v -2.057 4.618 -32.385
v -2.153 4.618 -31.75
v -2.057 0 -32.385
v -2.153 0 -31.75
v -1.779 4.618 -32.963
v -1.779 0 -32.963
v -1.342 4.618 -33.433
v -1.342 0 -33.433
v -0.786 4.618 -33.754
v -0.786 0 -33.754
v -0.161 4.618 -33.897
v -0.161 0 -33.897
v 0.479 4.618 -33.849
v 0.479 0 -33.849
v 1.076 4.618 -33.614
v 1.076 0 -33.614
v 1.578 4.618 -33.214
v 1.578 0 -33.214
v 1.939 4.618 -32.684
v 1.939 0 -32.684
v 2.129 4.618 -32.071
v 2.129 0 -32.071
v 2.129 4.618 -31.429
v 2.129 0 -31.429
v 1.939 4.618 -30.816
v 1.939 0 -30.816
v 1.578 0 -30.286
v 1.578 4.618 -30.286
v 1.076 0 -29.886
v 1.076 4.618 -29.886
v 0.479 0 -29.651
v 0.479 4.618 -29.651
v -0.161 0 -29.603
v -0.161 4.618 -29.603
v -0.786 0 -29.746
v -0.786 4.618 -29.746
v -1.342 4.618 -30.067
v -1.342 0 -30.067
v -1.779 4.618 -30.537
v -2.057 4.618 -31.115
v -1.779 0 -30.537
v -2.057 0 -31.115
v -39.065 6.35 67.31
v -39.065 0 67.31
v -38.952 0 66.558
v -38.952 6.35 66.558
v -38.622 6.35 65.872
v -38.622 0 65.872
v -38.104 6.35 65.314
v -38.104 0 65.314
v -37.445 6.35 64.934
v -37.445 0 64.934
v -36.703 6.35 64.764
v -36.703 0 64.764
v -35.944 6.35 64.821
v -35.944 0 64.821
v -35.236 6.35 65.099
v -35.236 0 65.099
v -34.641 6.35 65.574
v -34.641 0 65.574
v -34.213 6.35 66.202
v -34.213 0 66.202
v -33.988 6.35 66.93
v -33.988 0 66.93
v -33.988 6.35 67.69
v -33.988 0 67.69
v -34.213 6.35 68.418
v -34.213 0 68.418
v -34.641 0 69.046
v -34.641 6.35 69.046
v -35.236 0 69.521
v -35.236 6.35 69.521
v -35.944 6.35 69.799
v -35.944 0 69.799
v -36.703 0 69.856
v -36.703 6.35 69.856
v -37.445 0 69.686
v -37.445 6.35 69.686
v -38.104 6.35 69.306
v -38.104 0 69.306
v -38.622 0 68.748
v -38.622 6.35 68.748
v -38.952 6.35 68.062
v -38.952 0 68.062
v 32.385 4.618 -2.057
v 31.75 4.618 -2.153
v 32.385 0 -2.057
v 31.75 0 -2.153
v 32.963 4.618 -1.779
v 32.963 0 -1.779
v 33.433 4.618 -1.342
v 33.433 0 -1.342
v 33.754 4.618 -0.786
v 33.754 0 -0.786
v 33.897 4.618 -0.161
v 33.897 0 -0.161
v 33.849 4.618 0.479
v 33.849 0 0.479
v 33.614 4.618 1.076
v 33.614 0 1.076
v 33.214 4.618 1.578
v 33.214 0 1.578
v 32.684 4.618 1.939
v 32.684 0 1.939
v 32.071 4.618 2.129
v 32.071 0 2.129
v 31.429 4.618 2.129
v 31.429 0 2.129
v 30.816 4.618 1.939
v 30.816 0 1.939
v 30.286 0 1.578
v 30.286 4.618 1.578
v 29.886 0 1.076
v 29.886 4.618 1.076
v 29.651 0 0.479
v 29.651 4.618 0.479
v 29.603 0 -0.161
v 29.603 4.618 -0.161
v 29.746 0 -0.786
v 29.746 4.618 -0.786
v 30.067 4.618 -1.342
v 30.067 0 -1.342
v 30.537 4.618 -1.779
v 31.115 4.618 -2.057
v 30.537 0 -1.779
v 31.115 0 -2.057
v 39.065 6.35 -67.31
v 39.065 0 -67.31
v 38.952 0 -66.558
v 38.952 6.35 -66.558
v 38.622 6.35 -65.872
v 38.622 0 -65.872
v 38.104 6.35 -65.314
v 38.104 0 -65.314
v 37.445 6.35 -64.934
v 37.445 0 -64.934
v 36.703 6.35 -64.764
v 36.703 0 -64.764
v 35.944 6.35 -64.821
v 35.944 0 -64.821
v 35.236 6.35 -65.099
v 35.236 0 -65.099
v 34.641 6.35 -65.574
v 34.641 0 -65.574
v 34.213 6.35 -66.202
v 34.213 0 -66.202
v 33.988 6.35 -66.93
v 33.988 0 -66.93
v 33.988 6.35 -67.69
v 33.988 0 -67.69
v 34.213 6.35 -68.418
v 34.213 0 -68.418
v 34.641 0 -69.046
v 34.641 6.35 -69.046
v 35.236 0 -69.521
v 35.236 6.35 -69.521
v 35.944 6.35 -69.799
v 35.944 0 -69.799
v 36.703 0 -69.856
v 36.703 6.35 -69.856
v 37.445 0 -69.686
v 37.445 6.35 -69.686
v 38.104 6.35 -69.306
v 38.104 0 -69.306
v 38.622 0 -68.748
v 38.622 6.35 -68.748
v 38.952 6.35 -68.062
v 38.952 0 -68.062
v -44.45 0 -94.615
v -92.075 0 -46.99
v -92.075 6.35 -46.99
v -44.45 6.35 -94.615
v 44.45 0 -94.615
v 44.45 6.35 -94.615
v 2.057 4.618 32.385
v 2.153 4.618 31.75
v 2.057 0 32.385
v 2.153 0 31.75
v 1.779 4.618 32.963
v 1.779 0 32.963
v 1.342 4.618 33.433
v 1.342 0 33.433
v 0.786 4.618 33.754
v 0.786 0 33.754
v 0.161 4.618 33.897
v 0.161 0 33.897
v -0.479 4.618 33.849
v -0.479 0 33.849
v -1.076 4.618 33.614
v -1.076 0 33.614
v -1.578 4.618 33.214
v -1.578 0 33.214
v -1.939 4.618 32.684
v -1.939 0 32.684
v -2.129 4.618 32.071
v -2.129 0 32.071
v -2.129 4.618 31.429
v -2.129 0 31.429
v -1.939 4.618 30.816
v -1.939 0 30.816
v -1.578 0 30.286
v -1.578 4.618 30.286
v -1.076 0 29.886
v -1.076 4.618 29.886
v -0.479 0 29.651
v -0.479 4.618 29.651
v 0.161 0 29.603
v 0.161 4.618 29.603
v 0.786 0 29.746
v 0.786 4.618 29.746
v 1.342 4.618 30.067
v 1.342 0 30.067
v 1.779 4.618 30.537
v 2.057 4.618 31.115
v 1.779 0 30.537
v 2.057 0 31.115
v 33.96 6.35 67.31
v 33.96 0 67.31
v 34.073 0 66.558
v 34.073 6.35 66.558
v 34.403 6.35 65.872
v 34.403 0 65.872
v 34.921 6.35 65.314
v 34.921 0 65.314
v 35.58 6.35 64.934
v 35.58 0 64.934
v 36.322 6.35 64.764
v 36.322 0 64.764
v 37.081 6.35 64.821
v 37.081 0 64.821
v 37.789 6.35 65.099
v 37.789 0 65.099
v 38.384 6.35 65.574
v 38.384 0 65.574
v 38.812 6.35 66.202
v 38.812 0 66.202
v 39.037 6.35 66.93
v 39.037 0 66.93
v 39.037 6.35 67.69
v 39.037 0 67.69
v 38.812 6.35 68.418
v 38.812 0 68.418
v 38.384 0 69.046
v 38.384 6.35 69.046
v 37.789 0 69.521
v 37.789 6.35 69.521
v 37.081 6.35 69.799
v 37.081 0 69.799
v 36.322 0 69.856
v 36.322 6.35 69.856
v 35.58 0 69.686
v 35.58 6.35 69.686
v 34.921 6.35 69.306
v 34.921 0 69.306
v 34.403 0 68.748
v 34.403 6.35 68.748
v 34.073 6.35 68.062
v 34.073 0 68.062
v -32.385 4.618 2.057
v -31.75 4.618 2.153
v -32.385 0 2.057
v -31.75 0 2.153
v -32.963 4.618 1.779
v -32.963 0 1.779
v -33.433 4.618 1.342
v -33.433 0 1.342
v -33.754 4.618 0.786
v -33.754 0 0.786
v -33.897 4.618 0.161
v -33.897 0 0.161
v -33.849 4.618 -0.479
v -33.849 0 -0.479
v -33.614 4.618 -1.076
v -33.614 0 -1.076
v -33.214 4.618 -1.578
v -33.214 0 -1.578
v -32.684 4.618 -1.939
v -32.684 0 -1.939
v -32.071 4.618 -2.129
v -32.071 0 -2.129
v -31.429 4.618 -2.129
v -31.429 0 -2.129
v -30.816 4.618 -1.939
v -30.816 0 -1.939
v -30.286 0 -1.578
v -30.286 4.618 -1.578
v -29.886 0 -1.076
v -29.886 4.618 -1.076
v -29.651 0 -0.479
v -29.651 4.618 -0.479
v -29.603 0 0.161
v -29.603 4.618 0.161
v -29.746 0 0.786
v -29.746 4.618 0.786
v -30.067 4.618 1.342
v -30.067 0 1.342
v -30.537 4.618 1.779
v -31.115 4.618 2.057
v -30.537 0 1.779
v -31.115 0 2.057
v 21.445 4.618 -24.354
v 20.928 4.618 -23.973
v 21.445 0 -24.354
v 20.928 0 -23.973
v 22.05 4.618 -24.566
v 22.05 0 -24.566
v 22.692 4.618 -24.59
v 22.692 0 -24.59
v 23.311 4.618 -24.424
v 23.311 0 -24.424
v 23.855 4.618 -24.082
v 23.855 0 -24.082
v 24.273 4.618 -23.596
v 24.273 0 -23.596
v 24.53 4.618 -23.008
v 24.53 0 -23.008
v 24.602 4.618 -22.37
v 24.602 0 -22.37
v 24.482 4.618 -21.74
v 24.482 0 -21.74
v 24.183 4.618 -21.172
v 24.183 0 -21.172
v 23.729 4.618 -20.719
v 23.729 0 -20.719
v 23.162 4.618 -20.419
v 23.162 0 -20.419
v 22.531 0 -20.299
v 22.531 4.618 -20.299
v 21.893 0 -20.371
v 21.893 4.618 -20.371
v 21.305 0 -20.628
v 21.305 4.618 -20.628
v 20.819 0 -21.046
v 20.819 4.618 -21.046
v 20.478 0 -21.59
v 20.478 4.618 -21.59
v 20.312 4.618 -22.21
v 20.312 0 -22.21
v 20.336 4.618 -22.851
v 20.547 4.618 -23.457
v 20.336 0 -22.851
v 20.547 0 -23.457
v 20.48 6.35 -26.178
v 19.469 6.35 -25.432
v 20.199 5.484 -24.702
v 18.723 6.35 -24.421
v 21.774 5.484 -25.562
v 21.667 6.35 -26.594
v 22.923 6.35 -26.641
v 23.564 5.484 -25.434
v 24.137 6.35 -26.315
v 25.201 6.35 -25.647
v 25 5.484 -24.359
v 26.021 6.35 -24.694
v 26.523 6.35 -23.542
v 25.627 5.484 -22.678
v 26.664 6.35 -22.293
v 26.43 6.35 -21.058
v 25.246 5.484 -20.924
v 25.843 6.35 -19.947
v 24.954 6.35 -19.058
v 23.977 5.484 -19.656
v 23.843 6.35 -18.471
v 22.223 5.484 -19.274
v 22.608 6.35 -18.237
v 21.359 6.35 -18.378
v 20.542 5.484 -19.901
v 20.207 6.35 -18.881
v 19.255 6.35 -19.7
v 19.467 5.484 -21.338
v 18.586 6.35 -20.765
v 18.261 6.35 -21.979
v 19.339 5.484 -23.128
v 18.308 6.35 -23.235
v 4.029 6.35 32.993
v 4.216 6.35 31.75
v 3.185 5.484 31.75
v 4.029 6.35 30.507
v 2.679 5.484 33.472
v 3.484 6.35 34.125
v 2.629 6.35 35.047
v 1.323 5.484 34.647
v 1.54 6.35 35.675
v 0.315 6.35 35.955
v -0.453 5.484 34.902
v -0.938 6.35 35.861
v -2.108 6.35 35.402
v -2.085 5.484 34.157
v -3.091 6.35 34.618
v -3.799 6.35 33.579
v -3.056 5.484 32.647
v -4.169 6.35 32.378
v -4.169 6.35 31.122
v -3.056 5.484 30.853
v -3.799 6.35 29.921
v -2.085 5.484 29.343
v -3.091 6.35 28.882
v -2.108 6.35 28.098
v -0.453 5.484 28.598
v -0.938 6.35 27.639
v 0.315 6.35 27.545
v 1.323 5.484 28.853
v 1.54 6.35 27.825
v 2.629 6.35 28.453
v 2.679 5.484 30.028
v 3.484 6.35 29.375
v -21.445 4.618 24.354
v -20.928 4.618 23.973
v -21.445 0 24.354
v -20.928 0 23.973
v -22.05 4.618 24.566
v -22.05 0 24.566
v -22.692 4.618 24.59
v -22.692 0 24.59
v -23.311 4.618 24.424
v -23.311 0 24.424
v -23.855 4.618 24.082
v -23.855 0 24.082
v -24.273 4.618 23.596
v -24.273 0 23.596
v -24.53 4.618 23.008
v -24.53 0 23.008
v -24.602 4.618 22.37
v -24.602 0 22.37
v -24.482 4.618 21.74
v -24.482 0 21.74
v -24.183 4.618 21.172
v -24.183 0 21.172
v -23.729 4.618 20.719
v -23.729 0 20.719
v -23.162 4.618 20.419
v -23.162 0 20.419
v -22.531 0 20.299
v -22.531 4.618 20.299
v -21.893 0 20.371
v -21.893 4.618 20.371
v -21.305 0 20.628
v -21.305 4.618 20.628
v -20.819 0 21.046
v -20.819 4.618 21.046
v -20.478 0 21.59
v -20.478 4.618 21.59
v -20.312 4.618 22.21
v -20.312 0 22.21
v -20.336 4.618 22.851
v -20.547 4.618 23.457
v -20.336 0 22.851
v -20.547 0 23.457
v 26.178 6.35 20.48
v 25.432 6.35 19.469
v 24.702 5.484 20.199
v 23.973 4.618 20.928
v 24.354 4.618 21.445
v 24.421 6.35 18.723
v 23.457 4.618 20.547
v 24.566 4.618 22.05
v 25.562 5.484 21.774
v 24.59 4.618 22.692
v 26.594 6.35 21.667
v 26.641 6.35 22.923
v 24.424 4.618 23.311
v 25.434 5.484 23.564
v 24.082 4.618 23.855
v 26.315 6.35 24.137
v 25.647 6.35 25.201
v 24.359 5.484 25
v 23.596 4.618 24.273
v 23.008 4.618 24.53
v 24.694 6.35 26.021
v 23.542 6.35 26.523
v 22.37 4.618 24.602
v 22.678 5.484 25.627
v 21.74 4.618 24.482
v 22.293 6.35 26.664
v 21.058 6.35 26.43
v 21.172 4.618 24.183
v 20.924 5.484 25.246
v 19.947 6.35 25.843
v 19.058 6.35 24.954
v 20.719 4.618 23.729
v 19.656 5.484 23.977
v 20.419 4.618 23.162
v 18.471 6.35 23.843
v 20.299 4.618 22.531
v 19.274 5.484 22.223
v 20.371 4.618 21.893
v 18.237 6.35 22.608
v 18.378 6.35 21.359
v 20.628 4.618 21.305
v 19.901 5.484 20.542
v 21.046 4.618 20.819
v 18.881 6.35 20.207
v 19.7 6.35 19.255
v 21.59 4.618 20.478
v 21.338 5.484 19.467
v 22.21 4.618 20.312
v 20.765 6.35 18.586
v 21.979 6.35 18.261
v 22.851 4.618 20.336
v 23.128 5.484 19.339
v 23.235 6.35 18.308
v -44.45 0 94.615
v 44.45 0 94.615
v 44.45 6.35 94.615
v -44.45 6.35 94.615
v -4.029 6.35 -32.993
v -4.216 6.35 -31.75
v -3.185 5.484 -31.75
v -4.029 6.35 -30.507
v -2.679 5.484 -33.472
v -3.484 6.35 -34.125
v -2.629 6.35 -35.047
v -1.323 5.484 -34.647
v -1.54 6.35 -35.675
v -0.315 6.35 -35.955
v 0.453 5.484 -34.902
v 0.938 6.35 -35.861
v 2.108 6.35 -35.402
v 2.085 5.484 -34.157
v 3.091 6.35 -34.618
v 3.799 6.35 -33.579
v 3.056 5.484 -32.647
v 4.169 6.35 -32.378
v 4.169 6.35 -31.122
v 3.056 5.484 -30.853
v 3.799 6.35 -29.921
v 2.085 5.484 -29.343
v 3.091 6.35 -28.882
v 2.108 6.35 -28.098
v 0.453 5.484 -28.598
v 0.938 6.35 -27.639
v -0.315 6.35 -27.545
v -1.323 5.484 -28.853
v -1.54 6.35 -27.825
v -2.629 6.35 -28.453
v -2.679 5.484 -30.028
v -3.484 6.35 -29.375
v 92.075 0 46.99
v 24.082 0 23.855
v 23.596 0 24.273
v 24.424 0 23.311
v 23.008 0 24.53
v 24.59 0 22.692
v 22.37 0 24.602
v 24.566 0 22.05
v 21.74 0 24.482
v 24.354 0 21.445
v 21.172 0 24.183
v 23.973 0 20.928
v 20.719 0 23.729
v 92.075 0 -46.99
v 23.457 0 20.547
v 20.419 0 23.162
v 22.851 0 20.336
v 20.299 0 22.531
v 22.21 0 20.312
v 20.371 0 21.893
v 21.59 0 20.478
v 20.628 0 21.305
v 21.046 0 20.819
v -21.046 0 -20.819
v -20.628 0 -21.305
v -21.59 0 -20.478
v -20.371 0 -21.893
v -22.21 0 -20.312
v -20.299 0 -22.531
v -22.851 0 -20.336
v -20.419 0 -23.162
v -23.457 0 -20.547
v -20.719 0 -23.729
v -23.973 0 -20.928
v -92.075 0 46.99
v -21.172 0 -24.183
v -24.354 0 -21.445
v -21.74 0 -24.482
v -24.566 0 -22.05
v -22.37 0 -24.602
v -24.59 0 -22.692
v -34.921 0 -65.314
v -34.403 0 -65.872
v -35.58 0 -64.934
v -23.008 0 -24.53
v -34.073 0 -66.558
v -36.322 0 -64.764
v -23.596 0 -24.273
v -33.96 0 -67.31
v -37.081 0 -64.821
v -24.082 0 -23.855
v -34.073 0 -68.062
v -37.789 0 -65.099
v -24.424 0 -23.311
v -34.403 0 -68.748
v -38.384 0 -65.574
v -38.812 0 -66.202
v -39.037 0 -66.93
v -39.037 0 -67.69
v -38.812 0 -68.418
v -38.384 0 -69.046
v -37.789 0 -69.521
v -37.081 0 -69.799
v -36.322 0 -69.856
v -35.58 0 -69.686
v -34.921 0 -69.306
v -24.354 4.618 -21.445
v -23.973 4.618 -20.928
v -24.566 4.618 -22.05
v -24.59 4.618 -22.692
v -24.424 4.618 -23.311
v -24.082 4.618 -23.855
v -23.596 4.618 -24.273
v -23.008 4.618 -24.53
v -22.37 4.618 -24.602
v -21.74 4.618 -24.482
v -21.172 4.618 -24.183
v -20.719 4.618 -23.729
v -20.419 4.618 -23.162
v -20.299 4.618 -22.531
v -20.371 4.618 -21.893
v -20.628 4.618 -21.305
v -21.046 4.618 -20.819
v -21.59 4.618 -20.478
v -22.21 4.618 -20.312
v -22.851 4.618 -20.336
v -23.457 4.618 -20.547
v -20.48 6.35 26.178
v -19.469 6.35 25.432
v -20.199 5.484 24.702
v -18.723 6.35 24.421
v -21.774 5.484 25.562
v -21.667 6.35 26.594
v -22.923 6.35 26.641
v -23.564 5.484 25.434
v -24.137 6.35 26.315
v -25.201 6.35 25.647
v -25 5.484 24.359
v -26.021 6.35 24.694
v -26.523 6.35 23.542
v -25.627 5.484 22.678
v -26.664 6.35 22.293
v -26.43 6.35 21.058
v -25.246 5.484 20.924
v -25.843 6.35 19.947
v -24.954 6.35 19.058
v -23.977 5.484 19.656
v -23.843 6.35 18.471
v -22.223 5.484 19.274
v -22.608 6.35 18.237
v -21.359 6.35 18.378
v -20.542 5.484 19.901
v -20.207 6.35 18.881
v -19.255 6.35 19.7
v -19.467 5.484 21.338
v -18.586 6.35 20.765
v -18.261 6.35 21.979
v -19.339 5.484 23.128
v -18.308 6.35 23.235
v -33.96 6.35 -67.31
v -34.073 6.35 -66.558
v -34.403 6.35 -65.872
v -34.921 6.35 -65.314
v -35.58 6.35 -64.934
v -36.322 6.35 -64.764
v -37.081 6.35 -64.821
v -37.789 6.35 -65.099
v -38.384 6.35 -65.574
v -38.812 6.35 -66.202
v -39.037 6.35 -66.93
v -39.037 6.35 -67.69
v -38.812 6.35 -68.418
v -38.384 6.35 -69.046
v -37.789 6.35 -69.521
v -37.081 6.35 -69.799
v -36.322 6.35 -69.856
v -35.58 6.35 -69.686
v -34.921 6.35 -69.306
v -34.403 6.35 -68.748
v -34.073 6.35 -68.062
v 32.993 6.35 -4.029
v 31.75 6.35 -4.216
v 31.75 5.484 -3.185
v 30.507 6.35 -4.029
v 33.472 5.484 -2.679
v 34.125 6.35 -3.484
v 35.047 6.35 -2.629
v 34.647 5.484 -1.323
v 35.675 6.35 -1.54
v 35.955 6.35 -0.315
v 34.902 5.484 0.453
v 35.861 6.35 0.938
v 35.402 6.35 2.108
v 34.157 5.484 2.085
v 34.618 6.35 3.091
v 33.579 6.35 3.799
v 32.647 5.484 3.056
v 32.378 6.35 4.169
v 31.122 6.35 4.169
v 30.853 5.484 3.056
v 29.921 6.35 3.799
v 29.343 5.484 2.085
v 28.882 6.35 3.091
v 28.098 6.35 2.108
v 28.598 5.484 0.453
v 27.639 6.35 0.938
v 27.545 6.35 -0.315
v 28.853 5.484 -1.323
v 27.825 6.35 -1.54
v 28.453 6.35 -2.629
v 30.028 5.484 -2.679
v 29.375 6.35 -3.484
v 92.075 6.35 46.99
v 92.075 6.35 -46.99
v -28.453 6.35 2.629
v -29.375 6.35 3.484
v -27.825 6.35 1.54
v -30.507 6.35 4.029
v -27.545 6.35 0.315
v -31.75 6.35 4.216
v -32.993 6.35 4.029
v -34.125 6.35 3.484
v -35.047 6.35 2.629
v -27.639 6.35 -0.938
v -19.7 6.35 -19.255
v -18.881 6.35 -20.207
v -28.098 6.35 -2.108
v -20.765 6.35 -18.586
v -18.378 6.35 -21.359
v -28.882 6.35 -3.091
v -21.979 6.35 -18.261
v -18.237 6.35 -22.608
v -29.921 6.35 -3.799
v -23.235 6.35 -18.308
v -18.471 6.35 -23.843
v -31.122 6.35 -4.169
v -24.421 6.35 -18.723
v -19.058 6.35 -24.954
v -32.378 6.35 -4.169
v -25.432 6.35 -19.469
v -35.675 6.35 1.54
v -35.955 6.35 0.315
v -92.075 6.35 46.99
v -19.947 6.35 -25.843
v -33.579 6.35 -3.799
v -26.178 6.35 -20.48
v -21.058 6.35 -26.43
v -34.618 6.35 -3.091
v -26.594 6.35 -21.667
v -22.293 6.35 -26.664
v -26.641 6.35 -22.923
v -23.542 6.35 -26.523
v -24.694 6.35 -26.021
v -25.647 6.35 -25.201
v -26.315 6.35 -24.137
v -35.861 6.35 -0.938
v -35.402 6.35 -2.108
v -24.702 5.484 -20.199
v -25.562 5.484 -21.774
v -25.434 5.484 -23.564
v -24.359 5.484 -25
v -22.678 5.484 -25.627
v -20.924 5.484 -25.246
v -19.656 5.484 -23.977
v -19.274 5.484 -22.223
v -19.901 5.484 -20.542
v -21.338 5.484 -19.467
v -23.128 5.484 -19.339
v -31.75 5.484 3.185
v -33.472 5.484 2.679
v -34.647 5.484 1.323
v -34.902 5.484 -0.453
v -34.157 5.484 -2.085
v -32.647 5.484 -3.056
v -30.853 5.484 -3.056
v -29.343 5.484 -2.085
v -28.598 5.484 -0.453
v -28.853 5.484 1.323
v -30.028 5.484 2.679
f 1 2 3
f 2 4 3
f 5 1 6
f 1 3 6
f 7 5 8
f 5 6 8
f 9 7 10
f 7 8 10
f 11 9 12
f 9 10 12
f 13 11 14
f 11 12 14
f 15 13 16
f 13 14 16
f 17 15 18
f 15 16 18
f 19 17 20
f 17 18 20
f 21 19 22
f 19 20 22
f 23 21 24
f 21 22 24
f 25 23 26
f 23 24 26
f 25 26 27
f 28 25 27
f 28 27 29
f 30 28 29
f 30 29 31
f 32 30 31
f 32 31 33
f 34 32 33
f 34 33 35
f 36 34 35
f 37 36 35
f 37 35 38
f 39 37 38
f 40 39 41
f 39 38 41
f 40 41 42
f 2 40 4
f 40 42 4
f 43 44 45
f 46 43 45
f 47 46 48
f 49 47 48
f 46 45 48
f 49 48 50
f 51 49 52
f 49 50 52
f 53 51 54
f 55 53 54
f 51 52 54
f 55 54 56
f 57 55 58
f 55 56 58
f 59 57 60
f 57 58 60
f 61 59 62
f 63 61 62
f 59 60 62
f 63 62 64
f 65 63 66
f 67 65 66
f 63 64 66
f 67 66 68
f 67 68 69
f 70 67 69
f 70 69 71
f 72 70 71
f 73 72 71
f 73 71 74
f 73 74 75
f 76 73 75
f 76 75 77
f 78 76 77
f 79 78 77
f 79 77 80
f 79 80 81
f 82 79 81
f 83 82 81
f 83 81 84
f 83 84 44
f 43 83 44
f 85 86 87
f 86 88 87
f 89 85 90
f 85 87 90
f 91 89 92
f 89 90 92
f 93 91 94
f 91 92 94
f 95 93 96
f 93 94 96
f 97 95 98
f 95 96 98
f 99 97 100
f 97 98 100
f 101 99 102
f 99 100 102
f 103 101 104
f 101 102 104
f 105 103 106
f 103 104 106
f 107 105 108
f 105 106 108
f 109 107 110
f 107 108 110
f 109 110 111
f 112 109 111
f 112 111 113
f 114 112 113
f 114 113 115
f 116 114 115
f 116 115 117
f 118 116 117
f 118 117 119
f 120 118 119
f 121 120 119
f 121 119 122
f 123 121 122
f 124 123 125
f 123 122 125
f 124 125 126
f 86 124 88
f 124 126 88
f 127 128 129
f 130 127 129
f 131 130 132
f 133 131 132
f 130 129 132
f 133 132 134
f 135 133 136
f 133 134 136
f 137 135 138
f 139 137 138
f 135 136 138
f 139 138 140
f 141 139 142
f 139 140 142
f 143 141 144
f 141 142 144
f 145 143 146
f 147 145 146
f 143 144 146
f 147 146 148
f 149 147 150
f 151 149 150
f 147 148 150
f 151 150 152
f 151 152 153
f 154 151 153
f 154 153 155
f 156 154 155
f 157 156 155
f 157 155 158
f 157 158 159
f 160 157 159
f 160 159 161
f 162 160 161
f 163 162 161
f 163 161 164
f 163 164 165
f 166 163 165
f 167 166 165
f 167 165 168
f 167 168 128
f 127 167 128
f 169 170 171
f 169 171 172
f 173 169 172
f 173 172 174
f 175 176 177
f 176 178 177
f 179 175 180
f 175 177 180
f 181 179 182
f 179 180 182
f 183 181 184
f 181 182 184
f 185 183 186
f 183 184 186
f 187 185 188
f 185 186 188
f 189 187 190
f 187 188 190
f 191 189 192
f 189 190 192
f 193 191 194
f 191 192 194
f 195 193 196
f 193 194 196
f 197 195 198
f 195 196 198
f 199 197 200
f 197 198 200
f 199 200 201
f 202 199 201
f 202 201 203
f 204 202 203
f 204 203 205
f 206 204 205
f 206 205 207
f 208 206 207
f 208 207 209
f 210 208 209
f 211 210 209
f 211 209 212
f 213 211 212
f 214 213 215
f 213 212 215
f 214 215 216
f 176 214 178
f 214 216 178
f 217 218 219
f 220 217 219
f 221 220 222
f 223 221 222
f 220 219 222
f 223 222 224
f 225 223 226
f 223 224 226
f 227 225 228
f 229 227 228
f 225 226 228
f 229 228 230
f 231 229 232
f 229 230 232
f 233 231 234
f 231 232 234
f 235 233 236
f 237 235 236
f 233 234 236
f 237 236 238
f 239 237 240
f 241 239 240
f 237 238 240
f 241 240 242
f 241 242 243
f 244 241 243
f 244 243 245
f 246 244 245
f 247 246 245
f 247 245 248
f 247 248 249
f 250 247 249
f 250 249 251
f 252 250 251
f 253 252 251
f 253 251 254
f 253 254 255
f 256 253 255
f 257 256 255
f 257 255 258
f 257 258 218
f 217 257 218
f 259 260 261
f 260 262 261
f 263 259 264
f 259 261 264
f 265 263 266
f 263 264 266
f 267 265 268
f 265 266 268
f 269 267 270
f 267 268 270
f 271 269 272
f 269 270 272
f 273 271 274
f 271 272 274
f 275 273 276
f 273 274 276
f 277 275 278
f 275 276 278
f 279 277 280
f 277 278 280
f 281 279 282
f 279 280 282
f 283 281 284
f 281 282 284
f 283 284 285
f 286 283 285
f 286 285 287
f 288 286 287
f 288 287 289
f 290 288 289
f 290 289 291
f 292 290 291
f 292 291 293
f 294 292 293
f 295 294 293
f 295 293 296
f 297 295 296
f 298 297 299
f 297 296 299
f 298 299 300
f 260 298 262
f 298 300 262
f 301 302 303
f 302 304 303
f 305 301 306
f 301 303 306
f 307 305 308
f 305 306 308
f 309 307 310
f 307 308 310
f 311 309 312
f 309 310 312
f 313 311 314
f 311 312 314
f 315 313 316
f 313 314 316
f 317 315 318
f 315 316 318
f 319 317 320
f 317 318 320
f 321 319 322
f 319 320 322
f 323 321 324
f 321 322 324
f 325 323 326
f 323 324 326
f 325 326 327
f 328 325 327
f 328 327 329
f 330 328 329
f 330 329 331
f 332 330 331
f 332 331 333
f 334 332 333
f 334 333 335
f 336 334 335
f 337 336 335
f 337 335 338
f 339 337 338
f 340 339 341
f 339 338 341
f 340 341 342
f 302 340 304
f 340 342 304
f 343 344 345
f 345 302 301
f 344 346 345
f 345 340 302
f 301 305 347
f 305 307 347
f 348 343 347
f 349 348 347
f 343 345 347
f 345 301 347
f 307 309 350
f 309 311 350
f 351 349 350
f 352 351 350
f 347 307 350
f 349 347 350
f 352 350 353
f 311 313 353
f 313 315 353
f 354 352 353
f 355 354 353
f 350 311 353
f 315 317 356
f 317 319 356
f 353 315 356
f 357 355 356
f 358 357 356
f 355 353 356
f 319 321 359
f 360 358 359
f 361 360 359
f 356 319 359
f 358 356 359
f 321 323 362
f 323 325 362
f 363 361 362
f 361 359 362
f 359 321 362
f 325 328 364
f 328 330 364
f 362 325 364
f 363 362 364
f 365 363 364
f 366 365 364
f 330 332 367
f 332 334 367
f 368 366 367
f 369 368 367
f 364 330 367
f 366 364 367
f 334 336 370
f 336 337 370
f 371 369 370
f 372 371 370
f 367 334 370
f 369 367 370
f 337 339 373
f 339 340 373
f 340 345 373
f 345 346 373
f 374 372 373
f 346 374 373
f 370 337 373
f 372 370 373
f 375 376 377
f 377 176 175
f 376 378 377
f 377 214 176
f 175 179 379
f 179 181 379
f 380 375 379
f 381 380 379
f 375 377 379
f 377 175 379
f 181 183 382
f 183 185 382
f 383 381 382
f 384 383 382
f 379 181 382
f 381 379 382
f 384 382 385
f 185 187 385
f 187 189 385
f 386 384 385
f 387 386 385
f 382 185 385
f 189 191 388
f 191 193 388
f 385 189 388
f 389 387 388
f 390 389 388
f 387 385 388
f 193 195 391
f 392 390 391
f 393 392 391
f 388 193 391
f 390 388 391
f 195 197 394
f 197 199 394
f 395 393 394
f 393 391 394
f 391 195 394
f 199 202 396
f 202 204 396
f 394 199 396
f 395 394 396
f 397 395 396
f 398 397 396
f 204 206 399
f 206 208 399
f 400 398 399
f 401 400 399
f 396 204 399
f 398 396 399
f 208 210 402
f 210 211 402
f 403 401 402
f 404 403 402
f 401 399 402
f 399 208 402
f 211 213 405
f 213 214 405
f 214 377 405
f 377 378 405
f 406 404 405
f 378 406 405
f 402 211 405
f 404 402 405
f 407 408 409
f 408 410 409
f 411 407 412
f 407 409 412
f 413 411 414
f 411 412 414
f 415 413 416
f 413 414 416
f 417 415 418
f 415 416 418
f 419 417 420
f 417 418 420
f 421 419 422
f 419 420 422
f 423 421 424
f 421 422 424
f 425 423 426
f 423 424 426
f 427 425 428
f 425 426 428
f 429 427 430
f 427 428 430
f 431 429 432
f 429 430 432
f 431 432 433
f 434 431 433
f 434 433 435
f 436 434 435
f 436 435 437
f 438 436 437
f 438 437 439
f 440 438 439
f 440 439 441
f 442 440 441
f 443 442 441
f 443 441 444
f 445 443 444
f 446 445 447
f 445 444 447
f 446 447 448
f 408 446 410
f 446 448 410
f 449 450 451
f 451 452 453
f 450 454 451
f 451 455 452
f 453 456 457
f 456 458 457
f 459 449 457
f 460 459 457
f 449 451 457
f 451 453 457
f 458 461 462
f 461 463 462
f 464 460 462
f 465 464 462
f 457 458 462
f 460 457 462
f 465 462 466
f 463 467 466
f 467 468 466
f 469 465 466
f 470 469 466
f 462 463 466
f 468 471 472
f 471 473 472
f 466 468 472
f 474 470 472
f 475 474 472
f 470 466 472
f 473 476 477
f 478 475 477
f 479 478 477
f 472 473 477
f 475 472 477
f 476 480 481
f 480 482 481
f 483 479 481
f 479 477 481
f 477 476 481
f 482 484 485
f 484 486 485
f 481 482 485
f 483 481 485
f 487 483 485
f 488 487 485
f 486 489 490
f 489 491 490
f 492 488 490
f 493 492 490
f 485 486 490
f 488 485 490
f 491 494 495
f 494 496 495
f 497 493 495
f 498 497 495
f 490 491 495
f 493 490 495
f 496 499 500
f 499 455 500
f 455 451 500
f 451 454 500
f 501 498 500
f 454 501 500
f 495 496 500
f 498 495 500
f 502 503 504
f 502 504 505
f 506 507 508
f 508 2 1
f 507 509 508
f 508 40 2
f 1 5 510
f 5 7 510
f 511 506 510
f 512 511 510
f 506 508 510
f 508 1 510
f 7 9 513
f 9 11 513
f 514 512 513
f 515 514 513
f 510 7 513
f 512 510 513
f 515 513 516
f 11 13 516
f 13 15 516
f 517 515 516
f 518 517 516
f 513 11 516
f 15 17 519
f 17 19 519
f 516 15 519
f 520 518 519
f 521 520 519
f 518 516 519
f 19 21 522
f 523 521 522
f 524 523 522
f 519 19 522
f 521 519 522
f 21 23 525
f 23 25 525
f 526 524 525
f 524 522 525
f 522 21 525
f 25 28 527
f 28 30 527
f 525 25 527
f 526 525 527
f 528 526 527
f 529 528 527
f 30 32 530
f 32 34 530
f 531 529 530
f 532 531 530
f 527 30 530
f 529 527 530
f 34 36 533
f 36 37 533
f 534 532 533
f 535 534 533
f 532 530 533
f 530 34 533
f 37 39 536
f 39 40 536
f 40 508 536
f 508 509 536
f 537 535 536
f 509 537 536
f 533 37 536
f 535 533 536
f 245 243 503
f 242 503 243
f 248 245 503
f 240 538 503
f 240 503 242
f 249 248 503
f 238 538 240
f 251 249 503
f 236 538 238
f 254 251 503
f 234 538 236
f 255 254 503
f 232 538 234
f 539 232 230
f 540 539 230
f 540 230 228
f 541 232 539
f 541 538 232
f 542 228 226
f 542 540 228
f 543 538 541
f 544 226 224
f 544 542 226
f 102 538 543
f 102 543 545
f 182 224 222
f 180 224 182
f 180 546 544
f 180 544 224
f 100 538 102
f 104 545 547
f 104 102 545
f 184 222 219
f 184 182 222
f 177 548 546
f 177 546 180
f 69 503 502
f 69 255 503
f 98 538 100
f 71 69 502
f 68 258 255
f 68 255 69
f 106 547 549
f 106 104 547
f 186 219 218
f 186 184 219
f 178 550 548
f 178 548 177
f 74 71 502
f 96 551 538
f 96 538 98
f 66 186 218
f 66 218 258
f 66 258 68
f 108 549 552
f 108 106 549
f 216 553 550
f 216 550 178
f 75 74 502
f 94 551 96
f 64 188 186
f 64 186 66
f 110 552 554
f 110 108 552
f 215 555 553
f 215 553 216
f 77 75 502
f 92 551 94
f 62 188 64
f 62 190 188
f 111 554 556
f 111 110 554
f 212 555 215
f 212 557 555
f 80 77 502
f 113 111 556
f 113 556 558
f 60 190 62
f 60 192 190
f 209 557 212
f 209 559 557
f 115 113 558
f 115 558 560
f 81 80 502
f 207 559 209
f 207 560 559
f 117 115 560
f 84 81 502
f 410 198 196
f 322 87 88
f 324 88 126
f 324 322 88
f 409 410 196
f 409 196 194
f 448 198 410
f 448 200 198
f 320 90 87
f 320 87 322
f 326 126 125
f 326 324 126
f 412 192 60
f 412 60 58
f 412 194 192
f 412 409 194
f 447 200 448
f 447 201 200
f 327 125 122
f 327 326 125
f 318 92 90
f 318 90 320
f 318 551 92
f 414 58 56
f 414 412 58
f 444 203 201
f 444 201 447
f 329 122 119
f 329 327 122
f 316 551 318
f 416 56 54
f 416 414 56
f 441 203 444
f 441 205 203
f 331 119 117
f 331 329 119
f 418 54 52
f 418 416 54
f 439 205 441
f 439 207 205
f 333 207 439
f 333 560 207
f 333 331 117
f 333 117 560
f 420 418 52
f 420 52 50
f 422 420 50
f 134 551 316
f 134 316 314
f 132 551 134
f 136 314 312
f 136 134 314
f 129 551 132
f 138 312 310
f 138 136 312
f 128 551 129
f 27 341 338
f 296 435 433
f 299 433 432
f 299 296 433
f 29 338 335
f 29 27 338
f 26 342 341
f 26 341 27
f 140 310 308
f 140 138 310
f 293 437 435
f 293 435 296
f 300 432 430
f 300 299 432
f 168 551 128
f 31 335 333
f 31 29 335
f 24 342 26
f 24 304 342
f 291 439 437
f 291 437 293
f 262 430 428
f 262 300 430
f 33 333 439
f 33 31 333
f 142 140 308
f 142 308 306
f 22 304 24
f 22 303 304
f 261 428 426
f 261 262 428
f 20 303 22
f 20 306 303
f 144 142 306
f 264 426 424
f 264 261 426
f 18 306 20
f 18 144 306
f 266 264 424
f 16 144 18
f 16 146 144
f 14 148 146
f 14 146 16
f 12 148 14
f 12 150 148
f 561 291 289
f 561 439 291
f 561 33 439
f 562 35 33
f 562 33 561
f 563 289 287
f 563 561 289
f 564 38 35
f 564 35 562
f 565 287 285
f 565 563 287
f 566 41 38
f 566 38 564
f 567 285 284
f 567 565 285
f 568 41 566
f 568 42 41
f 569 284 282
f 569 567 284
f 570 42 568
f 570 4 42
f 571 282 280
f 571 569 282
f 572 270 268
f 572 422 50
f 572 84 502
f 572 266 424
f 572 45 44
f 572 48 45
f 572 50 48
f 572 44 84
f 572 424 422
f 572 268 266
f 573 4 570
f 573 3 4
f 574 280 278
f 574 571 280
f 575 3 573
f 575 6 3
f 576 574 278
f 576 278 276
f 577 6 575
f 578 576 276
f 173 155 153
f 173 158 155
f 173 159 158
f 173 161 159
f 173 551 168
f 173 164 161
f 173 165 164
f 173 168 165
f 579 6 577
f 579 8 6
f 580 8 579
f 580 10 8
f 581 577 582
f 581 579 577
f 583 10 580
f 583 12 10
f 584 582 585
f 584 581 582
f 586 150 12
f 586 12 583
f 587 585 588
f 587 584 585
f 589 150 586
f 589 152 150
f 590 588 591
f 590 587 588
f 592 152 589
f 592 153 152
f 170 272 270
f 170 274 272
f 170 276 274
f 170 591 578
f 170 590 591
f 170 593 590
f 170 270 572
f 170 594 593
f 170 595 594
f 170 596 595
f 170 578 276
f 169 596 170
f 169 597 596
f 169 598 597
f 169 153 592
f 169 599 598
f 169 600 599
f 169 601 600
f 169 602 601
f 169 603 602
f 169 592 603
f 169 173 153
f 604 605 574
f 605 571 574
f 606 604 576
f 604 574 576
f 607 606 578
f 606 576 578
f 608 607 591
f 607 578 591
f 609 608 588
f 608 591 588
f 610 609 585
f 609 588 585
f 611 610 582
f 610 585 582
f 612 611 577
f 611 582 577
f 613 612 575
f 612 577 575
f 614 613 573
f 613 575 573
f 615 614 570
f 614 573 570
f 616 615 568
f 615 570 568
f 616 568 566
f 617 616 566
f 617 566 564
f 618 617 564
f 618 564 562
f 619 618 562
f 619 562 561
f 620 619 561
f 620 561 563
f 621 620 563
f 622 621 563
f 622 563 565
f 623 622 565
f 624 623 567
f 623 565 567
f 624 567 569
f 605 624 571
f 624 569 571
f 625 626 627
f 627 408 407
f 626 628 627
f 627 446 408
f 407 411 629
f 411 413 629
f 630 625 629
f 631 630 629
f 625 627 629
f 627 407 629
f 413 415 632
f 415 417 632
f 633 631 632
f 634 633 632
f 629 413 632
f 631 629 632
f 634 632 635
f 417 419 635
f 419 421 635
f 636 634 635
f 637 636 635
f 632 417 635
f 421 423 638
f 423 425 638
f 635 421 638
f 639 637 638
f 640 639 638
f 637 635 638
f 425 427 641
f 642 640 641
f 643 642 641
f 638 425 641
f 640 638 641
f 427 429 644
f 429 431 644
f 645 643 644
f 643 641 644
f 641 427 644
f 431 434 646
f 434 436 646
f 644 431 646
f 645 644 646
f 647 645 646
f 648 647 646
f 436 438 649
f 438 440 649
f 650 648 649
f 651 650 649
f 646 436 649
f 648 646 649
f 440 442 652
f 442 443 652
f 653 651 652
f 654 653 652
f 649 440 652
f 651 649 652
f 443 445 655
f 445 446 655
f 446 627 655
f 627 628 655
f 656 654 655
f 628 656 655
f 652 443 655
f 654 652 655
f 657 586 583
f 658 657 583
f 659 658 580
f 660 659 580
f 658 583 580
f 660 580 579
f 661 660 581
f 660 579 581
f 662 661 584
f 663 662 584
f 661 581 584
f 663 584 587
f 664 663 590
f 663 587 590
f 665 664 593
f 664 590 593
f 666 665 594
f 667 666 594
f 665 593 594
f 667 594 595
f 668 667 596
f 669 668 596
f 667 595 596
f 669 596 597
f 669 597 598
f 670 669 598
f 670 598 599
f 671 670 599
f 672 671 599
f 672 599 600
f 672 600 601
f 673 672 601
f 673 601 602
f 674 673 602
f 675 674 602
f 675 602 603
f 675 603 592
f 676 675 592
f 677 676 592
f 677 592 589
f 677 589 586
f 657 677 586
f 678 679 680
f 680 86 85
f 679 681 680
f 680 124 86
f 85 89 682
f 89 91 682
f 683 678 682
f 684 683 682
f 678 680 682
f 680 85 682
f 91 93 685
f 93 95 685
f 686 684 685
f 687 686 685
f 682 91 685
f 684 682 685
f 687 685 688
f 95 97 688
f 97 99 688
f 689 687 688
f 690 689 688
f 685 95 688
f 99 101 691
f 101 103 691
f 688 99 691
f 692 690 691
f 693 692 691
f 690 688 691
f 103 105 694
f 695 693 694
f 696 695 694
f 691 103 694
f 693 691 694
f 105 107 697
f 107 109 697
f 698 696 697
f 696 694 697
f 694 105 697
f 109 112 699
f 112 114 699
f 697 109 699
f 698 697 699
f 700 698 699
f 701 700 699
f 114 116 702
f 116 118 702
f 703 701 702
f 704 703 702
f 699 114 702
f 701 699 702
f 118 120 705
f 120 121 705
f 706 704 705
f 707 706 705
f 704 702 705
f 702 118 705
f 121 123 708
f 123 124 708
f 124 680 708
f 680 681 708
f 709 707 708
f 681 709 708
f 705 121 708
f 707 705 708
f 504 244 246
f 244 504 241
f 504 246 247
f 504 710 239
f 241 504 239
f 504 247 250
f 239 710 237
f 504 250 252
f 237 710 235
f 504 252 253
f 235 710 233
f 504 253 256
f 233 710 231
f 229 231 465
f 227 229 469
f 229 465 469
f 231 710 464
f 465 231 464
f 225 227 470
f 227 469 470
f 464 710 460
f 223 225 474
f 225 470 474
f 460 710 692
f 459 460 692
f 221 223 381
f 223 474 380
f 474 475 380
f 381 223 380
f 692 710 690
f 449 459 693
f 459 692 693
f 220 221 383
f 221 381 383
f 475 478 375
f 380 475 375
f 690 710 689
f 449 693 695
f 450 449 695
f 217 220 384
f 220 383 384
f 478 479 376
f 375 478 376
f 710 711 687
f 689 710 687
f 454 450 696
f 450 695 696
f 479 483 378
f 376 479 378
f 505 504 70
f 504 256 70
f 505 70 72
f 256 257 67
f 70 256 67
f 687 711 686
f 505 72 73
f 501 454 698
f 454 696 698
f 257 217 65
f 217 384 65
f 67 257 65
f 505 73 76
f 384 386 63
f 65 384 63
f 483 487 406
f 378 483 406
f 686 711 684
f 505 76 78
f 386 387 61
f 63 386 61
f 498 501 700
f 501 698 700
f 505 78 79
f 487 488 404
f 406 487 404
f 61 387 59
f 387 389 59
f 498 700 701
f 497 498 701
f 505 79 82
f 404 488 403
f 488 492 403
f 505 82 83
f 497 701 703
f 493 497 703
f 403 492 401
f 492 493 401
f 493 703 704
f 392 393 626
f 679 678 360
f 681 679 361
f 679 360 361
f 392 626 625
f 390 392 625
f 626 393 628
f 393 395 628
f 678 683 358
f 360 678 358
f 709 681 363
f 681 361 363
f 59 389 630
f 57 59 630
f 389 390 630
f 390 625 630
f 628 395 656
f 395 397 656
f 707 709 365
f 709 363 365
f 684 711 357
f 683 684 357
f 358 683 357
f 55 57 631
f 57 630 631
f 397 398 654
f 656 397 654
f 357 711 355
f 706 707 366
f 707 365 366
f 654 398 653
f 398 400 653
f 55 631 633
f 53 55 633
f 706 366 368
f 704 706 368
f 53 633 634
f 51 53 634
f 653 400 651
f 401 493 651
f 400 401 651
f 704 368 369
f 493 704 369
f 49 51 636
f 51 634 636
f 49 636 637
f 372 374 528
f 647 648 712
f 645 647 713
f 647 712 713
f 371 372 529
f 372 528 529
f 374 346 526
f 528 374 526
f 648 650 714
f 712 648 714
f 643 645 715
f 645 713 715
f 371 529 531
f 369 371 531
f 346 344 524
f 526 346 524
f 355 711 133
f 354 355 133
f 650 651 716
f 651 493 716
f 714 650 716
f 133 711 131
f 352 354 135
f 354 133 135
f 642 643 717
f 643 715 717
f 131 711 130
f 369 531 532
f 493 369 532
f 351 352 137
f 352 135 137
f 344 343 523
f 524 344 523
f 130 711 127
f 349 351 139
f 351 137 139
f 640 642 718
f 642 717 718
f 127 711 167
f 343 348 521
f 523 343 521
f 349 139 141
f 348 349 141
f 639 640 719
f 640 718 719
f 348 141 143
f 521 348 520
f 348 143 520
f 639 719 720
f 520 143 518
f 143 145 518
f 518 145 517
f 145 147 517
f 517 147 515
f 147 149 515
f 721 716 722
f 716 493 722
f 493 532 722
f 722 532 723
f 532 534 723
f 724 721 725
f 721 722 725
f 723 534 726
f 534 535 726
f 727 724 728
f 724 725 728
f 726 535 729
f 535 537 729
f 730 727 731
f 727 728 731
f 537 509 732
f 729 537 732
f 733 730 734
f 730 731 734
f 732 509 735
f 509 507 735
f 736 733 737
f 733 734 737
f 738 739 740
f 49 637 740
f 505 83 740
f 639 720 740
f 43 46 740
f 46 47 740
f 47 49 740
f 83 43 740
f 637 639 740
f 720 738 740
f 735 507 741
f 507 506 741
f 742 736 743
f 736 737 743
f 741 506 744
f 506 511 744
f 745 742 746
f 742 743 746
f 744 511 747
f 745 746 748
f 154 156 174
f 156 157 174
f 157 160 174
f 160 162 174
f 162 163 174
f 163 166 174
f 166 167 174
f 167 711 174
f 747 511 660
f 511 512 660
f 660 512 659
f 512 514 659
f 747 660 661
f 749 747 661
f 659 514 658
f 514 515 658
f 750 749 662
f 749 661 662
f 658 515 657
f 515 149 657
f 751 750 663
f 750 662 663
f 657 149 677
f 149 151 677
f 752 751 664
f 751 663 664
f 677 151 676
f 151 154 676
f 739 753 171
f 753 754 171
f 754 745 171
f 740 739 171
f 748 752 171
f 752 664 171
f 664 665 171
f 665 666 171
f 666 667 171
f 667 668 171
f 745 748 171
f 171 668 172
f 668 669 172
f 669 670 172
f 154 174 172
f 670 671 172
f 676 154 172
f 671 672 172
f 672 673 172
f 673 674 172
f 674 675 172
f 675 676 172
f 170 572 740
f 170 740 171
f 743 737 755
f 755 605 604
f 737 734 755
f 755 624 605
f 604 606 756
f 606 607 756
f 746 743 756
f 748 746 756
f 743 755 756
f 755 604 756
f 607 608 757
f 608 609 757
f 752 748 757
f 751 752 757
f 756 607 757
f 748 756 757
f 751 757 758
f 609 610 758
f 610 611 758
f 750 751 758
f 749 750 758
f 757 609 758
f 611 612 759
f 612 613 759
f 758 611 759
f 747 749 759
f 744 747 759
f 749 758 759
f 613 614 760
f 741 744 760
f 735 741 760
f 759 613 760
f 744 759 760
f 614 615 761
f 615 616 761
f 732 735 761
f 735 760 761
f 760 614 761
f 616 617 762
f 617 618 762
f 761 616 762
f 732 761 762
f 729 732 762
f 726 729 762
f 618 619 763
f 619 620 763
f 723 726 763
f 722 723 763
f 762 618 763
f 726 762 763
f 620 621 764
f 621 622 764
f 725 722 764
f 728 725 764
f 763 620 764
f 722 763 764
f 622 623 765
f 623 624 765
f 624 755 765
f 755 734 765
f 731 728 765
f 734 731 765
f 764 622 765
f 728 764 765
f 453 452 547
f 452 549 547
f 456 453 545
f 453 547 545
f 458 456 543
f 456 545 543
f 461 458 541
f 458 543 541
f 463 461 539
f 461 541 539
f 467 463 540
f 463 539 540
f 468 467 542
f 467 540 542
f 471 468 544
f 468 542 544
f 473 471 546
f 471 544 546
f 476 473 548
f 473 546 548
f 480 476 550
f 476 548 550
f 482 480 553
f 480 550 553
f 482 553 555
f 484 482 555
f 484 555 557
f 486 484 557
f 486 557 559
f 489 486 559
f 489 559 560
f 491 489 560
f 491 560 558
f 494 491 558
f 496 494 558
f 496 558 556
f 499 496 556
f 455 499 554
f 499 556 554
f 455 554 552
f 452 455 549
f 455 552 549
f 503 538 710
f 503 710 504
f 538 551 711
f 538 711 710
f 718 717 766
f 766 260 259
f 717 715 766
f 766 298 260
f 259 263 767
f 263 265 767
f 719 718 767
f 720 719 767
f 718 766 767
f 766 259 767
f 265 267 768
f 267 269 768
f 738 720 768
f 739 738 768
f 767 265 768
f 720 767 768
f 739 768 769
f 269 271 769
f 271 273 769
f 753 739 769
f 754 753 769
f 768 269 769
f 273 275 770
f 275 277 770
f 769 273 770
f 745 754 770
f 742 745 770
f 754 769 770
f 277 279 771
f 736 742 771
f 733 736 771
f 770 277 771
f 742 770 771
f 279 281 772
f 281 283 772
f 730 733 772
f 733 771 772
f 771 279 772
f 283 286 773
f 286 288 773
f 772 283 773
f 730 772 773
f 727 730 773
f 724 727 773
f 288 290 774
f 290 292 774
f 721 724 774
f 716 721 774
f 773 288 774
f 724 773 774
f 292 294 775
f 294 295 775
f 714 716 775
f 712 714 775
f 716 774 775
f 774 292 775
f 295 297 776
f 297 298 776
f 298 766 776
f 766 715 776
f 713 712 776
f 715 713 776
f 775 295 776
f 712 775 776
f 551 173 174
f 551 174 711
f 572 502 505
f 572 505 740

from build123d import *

# Parameters (mm, degrees)
BOSS_EXTRUDE1_DEPTH                               = 6.35
F_7_0_201_DIAMETER_HOLE1_D                        = 5.1054
CIRPATTERN1_COUNT                                 = 2
CSK_FOR_8_FLAT_HEAD_MACHINE_SCREW_100_D           = 4.3053
CSK_FOR_8_FLAT_HEAD_MACHINE_SCREW_100_CSINK_D     = 8.4328
CSK_FOR_8_FLAT_HEAD_MACHINE_SCREW_100_CSINK_ANGLE = 100
CIRPATTERN2_COUNT                                 = 8


with BuildPart() as part:
    # Sketch1 → Boss-Extrude1 (new body)
    with BuildSketch(Plane(origin=(0, 0, 0), x_dir=(1, 0, 0), z_dir=(0, 1, 0))):
        Polygon((-92.075, 46.99), (-44.45, 94.615), (44.45, 94.615), (92.075, 46.99), (92.075, -46.99), (44.45, -94.615), (-44.45, -94.615), (-92.075, -46.99), align=None)
    extrude(amount=BOSS_EXTRUDE1_DEPTH)

    # #7 (0.201) Diameter Hole1 (through all)
    with Locations(Plane(origin=(0, 6.35, 0), x_dir=(-1, 0, 0), z_dir=(0, 1, 0))):
        with Locations((36.5125, -67.31), (-36.5125, -67.31)):
            f_7_0_201_diameter_hole1 = Hole(F_7_0_201_DIAMETER_HOLE1_D / 2)

    # CirPattern1: #7 (0.201) Diameter Hole1 ×2 about axis
    cirpattern1_axis = Axis((0, 0, 0), (0, 1, 0))
    for i in range(1, CIRPATTERN1_COUNT):
        add(f_7_0_201_diameter_hole1.rotate(cirpattern1_axis, i * 360 / CIRPATTERN1_COUNT), mode=Mode.SUBTRACT)

    # CSK for #8 Flat Head Machine Screw (100)1 (through all)
    with Locations(Plane(origin=(0, 6.35, 0), x_dir=(-1, 0, 0), z_dir=(0, 1, 0))):
        with Locations((0, 31.75)):
            csk_for_8_flat_head_machine_screw_100 = CounterSinkHole(CSK_FOR_8_FLAT_HEAD_MACHINE_SCREW_100_D / 2, CSK_FOR_8_FLAT_HEAD_MACHINE_SCREW_100_CSINK_D / 2, counter_sink_angle=CSK_FOR_8_FLAT_HEAD_MACHINE_SCREW_100_CSINK_ANGLE)

    # CirPattern2: CSK for #8 Flat Head Machine Screw (100)1 ×8 about axis
    cirpattern2_axis = Axis((0, 0, 0), (0, 1, 0))
    for i in range(1, CIRPATTERN2_COUNT):
        add(csk_for_8_flat_head_machine_screw_100.rotate(cirpattern2_axis, i * 360 / CIRPATTERN2_COUNT), mode=Mode.SUBTRACT)


solid = part.part
